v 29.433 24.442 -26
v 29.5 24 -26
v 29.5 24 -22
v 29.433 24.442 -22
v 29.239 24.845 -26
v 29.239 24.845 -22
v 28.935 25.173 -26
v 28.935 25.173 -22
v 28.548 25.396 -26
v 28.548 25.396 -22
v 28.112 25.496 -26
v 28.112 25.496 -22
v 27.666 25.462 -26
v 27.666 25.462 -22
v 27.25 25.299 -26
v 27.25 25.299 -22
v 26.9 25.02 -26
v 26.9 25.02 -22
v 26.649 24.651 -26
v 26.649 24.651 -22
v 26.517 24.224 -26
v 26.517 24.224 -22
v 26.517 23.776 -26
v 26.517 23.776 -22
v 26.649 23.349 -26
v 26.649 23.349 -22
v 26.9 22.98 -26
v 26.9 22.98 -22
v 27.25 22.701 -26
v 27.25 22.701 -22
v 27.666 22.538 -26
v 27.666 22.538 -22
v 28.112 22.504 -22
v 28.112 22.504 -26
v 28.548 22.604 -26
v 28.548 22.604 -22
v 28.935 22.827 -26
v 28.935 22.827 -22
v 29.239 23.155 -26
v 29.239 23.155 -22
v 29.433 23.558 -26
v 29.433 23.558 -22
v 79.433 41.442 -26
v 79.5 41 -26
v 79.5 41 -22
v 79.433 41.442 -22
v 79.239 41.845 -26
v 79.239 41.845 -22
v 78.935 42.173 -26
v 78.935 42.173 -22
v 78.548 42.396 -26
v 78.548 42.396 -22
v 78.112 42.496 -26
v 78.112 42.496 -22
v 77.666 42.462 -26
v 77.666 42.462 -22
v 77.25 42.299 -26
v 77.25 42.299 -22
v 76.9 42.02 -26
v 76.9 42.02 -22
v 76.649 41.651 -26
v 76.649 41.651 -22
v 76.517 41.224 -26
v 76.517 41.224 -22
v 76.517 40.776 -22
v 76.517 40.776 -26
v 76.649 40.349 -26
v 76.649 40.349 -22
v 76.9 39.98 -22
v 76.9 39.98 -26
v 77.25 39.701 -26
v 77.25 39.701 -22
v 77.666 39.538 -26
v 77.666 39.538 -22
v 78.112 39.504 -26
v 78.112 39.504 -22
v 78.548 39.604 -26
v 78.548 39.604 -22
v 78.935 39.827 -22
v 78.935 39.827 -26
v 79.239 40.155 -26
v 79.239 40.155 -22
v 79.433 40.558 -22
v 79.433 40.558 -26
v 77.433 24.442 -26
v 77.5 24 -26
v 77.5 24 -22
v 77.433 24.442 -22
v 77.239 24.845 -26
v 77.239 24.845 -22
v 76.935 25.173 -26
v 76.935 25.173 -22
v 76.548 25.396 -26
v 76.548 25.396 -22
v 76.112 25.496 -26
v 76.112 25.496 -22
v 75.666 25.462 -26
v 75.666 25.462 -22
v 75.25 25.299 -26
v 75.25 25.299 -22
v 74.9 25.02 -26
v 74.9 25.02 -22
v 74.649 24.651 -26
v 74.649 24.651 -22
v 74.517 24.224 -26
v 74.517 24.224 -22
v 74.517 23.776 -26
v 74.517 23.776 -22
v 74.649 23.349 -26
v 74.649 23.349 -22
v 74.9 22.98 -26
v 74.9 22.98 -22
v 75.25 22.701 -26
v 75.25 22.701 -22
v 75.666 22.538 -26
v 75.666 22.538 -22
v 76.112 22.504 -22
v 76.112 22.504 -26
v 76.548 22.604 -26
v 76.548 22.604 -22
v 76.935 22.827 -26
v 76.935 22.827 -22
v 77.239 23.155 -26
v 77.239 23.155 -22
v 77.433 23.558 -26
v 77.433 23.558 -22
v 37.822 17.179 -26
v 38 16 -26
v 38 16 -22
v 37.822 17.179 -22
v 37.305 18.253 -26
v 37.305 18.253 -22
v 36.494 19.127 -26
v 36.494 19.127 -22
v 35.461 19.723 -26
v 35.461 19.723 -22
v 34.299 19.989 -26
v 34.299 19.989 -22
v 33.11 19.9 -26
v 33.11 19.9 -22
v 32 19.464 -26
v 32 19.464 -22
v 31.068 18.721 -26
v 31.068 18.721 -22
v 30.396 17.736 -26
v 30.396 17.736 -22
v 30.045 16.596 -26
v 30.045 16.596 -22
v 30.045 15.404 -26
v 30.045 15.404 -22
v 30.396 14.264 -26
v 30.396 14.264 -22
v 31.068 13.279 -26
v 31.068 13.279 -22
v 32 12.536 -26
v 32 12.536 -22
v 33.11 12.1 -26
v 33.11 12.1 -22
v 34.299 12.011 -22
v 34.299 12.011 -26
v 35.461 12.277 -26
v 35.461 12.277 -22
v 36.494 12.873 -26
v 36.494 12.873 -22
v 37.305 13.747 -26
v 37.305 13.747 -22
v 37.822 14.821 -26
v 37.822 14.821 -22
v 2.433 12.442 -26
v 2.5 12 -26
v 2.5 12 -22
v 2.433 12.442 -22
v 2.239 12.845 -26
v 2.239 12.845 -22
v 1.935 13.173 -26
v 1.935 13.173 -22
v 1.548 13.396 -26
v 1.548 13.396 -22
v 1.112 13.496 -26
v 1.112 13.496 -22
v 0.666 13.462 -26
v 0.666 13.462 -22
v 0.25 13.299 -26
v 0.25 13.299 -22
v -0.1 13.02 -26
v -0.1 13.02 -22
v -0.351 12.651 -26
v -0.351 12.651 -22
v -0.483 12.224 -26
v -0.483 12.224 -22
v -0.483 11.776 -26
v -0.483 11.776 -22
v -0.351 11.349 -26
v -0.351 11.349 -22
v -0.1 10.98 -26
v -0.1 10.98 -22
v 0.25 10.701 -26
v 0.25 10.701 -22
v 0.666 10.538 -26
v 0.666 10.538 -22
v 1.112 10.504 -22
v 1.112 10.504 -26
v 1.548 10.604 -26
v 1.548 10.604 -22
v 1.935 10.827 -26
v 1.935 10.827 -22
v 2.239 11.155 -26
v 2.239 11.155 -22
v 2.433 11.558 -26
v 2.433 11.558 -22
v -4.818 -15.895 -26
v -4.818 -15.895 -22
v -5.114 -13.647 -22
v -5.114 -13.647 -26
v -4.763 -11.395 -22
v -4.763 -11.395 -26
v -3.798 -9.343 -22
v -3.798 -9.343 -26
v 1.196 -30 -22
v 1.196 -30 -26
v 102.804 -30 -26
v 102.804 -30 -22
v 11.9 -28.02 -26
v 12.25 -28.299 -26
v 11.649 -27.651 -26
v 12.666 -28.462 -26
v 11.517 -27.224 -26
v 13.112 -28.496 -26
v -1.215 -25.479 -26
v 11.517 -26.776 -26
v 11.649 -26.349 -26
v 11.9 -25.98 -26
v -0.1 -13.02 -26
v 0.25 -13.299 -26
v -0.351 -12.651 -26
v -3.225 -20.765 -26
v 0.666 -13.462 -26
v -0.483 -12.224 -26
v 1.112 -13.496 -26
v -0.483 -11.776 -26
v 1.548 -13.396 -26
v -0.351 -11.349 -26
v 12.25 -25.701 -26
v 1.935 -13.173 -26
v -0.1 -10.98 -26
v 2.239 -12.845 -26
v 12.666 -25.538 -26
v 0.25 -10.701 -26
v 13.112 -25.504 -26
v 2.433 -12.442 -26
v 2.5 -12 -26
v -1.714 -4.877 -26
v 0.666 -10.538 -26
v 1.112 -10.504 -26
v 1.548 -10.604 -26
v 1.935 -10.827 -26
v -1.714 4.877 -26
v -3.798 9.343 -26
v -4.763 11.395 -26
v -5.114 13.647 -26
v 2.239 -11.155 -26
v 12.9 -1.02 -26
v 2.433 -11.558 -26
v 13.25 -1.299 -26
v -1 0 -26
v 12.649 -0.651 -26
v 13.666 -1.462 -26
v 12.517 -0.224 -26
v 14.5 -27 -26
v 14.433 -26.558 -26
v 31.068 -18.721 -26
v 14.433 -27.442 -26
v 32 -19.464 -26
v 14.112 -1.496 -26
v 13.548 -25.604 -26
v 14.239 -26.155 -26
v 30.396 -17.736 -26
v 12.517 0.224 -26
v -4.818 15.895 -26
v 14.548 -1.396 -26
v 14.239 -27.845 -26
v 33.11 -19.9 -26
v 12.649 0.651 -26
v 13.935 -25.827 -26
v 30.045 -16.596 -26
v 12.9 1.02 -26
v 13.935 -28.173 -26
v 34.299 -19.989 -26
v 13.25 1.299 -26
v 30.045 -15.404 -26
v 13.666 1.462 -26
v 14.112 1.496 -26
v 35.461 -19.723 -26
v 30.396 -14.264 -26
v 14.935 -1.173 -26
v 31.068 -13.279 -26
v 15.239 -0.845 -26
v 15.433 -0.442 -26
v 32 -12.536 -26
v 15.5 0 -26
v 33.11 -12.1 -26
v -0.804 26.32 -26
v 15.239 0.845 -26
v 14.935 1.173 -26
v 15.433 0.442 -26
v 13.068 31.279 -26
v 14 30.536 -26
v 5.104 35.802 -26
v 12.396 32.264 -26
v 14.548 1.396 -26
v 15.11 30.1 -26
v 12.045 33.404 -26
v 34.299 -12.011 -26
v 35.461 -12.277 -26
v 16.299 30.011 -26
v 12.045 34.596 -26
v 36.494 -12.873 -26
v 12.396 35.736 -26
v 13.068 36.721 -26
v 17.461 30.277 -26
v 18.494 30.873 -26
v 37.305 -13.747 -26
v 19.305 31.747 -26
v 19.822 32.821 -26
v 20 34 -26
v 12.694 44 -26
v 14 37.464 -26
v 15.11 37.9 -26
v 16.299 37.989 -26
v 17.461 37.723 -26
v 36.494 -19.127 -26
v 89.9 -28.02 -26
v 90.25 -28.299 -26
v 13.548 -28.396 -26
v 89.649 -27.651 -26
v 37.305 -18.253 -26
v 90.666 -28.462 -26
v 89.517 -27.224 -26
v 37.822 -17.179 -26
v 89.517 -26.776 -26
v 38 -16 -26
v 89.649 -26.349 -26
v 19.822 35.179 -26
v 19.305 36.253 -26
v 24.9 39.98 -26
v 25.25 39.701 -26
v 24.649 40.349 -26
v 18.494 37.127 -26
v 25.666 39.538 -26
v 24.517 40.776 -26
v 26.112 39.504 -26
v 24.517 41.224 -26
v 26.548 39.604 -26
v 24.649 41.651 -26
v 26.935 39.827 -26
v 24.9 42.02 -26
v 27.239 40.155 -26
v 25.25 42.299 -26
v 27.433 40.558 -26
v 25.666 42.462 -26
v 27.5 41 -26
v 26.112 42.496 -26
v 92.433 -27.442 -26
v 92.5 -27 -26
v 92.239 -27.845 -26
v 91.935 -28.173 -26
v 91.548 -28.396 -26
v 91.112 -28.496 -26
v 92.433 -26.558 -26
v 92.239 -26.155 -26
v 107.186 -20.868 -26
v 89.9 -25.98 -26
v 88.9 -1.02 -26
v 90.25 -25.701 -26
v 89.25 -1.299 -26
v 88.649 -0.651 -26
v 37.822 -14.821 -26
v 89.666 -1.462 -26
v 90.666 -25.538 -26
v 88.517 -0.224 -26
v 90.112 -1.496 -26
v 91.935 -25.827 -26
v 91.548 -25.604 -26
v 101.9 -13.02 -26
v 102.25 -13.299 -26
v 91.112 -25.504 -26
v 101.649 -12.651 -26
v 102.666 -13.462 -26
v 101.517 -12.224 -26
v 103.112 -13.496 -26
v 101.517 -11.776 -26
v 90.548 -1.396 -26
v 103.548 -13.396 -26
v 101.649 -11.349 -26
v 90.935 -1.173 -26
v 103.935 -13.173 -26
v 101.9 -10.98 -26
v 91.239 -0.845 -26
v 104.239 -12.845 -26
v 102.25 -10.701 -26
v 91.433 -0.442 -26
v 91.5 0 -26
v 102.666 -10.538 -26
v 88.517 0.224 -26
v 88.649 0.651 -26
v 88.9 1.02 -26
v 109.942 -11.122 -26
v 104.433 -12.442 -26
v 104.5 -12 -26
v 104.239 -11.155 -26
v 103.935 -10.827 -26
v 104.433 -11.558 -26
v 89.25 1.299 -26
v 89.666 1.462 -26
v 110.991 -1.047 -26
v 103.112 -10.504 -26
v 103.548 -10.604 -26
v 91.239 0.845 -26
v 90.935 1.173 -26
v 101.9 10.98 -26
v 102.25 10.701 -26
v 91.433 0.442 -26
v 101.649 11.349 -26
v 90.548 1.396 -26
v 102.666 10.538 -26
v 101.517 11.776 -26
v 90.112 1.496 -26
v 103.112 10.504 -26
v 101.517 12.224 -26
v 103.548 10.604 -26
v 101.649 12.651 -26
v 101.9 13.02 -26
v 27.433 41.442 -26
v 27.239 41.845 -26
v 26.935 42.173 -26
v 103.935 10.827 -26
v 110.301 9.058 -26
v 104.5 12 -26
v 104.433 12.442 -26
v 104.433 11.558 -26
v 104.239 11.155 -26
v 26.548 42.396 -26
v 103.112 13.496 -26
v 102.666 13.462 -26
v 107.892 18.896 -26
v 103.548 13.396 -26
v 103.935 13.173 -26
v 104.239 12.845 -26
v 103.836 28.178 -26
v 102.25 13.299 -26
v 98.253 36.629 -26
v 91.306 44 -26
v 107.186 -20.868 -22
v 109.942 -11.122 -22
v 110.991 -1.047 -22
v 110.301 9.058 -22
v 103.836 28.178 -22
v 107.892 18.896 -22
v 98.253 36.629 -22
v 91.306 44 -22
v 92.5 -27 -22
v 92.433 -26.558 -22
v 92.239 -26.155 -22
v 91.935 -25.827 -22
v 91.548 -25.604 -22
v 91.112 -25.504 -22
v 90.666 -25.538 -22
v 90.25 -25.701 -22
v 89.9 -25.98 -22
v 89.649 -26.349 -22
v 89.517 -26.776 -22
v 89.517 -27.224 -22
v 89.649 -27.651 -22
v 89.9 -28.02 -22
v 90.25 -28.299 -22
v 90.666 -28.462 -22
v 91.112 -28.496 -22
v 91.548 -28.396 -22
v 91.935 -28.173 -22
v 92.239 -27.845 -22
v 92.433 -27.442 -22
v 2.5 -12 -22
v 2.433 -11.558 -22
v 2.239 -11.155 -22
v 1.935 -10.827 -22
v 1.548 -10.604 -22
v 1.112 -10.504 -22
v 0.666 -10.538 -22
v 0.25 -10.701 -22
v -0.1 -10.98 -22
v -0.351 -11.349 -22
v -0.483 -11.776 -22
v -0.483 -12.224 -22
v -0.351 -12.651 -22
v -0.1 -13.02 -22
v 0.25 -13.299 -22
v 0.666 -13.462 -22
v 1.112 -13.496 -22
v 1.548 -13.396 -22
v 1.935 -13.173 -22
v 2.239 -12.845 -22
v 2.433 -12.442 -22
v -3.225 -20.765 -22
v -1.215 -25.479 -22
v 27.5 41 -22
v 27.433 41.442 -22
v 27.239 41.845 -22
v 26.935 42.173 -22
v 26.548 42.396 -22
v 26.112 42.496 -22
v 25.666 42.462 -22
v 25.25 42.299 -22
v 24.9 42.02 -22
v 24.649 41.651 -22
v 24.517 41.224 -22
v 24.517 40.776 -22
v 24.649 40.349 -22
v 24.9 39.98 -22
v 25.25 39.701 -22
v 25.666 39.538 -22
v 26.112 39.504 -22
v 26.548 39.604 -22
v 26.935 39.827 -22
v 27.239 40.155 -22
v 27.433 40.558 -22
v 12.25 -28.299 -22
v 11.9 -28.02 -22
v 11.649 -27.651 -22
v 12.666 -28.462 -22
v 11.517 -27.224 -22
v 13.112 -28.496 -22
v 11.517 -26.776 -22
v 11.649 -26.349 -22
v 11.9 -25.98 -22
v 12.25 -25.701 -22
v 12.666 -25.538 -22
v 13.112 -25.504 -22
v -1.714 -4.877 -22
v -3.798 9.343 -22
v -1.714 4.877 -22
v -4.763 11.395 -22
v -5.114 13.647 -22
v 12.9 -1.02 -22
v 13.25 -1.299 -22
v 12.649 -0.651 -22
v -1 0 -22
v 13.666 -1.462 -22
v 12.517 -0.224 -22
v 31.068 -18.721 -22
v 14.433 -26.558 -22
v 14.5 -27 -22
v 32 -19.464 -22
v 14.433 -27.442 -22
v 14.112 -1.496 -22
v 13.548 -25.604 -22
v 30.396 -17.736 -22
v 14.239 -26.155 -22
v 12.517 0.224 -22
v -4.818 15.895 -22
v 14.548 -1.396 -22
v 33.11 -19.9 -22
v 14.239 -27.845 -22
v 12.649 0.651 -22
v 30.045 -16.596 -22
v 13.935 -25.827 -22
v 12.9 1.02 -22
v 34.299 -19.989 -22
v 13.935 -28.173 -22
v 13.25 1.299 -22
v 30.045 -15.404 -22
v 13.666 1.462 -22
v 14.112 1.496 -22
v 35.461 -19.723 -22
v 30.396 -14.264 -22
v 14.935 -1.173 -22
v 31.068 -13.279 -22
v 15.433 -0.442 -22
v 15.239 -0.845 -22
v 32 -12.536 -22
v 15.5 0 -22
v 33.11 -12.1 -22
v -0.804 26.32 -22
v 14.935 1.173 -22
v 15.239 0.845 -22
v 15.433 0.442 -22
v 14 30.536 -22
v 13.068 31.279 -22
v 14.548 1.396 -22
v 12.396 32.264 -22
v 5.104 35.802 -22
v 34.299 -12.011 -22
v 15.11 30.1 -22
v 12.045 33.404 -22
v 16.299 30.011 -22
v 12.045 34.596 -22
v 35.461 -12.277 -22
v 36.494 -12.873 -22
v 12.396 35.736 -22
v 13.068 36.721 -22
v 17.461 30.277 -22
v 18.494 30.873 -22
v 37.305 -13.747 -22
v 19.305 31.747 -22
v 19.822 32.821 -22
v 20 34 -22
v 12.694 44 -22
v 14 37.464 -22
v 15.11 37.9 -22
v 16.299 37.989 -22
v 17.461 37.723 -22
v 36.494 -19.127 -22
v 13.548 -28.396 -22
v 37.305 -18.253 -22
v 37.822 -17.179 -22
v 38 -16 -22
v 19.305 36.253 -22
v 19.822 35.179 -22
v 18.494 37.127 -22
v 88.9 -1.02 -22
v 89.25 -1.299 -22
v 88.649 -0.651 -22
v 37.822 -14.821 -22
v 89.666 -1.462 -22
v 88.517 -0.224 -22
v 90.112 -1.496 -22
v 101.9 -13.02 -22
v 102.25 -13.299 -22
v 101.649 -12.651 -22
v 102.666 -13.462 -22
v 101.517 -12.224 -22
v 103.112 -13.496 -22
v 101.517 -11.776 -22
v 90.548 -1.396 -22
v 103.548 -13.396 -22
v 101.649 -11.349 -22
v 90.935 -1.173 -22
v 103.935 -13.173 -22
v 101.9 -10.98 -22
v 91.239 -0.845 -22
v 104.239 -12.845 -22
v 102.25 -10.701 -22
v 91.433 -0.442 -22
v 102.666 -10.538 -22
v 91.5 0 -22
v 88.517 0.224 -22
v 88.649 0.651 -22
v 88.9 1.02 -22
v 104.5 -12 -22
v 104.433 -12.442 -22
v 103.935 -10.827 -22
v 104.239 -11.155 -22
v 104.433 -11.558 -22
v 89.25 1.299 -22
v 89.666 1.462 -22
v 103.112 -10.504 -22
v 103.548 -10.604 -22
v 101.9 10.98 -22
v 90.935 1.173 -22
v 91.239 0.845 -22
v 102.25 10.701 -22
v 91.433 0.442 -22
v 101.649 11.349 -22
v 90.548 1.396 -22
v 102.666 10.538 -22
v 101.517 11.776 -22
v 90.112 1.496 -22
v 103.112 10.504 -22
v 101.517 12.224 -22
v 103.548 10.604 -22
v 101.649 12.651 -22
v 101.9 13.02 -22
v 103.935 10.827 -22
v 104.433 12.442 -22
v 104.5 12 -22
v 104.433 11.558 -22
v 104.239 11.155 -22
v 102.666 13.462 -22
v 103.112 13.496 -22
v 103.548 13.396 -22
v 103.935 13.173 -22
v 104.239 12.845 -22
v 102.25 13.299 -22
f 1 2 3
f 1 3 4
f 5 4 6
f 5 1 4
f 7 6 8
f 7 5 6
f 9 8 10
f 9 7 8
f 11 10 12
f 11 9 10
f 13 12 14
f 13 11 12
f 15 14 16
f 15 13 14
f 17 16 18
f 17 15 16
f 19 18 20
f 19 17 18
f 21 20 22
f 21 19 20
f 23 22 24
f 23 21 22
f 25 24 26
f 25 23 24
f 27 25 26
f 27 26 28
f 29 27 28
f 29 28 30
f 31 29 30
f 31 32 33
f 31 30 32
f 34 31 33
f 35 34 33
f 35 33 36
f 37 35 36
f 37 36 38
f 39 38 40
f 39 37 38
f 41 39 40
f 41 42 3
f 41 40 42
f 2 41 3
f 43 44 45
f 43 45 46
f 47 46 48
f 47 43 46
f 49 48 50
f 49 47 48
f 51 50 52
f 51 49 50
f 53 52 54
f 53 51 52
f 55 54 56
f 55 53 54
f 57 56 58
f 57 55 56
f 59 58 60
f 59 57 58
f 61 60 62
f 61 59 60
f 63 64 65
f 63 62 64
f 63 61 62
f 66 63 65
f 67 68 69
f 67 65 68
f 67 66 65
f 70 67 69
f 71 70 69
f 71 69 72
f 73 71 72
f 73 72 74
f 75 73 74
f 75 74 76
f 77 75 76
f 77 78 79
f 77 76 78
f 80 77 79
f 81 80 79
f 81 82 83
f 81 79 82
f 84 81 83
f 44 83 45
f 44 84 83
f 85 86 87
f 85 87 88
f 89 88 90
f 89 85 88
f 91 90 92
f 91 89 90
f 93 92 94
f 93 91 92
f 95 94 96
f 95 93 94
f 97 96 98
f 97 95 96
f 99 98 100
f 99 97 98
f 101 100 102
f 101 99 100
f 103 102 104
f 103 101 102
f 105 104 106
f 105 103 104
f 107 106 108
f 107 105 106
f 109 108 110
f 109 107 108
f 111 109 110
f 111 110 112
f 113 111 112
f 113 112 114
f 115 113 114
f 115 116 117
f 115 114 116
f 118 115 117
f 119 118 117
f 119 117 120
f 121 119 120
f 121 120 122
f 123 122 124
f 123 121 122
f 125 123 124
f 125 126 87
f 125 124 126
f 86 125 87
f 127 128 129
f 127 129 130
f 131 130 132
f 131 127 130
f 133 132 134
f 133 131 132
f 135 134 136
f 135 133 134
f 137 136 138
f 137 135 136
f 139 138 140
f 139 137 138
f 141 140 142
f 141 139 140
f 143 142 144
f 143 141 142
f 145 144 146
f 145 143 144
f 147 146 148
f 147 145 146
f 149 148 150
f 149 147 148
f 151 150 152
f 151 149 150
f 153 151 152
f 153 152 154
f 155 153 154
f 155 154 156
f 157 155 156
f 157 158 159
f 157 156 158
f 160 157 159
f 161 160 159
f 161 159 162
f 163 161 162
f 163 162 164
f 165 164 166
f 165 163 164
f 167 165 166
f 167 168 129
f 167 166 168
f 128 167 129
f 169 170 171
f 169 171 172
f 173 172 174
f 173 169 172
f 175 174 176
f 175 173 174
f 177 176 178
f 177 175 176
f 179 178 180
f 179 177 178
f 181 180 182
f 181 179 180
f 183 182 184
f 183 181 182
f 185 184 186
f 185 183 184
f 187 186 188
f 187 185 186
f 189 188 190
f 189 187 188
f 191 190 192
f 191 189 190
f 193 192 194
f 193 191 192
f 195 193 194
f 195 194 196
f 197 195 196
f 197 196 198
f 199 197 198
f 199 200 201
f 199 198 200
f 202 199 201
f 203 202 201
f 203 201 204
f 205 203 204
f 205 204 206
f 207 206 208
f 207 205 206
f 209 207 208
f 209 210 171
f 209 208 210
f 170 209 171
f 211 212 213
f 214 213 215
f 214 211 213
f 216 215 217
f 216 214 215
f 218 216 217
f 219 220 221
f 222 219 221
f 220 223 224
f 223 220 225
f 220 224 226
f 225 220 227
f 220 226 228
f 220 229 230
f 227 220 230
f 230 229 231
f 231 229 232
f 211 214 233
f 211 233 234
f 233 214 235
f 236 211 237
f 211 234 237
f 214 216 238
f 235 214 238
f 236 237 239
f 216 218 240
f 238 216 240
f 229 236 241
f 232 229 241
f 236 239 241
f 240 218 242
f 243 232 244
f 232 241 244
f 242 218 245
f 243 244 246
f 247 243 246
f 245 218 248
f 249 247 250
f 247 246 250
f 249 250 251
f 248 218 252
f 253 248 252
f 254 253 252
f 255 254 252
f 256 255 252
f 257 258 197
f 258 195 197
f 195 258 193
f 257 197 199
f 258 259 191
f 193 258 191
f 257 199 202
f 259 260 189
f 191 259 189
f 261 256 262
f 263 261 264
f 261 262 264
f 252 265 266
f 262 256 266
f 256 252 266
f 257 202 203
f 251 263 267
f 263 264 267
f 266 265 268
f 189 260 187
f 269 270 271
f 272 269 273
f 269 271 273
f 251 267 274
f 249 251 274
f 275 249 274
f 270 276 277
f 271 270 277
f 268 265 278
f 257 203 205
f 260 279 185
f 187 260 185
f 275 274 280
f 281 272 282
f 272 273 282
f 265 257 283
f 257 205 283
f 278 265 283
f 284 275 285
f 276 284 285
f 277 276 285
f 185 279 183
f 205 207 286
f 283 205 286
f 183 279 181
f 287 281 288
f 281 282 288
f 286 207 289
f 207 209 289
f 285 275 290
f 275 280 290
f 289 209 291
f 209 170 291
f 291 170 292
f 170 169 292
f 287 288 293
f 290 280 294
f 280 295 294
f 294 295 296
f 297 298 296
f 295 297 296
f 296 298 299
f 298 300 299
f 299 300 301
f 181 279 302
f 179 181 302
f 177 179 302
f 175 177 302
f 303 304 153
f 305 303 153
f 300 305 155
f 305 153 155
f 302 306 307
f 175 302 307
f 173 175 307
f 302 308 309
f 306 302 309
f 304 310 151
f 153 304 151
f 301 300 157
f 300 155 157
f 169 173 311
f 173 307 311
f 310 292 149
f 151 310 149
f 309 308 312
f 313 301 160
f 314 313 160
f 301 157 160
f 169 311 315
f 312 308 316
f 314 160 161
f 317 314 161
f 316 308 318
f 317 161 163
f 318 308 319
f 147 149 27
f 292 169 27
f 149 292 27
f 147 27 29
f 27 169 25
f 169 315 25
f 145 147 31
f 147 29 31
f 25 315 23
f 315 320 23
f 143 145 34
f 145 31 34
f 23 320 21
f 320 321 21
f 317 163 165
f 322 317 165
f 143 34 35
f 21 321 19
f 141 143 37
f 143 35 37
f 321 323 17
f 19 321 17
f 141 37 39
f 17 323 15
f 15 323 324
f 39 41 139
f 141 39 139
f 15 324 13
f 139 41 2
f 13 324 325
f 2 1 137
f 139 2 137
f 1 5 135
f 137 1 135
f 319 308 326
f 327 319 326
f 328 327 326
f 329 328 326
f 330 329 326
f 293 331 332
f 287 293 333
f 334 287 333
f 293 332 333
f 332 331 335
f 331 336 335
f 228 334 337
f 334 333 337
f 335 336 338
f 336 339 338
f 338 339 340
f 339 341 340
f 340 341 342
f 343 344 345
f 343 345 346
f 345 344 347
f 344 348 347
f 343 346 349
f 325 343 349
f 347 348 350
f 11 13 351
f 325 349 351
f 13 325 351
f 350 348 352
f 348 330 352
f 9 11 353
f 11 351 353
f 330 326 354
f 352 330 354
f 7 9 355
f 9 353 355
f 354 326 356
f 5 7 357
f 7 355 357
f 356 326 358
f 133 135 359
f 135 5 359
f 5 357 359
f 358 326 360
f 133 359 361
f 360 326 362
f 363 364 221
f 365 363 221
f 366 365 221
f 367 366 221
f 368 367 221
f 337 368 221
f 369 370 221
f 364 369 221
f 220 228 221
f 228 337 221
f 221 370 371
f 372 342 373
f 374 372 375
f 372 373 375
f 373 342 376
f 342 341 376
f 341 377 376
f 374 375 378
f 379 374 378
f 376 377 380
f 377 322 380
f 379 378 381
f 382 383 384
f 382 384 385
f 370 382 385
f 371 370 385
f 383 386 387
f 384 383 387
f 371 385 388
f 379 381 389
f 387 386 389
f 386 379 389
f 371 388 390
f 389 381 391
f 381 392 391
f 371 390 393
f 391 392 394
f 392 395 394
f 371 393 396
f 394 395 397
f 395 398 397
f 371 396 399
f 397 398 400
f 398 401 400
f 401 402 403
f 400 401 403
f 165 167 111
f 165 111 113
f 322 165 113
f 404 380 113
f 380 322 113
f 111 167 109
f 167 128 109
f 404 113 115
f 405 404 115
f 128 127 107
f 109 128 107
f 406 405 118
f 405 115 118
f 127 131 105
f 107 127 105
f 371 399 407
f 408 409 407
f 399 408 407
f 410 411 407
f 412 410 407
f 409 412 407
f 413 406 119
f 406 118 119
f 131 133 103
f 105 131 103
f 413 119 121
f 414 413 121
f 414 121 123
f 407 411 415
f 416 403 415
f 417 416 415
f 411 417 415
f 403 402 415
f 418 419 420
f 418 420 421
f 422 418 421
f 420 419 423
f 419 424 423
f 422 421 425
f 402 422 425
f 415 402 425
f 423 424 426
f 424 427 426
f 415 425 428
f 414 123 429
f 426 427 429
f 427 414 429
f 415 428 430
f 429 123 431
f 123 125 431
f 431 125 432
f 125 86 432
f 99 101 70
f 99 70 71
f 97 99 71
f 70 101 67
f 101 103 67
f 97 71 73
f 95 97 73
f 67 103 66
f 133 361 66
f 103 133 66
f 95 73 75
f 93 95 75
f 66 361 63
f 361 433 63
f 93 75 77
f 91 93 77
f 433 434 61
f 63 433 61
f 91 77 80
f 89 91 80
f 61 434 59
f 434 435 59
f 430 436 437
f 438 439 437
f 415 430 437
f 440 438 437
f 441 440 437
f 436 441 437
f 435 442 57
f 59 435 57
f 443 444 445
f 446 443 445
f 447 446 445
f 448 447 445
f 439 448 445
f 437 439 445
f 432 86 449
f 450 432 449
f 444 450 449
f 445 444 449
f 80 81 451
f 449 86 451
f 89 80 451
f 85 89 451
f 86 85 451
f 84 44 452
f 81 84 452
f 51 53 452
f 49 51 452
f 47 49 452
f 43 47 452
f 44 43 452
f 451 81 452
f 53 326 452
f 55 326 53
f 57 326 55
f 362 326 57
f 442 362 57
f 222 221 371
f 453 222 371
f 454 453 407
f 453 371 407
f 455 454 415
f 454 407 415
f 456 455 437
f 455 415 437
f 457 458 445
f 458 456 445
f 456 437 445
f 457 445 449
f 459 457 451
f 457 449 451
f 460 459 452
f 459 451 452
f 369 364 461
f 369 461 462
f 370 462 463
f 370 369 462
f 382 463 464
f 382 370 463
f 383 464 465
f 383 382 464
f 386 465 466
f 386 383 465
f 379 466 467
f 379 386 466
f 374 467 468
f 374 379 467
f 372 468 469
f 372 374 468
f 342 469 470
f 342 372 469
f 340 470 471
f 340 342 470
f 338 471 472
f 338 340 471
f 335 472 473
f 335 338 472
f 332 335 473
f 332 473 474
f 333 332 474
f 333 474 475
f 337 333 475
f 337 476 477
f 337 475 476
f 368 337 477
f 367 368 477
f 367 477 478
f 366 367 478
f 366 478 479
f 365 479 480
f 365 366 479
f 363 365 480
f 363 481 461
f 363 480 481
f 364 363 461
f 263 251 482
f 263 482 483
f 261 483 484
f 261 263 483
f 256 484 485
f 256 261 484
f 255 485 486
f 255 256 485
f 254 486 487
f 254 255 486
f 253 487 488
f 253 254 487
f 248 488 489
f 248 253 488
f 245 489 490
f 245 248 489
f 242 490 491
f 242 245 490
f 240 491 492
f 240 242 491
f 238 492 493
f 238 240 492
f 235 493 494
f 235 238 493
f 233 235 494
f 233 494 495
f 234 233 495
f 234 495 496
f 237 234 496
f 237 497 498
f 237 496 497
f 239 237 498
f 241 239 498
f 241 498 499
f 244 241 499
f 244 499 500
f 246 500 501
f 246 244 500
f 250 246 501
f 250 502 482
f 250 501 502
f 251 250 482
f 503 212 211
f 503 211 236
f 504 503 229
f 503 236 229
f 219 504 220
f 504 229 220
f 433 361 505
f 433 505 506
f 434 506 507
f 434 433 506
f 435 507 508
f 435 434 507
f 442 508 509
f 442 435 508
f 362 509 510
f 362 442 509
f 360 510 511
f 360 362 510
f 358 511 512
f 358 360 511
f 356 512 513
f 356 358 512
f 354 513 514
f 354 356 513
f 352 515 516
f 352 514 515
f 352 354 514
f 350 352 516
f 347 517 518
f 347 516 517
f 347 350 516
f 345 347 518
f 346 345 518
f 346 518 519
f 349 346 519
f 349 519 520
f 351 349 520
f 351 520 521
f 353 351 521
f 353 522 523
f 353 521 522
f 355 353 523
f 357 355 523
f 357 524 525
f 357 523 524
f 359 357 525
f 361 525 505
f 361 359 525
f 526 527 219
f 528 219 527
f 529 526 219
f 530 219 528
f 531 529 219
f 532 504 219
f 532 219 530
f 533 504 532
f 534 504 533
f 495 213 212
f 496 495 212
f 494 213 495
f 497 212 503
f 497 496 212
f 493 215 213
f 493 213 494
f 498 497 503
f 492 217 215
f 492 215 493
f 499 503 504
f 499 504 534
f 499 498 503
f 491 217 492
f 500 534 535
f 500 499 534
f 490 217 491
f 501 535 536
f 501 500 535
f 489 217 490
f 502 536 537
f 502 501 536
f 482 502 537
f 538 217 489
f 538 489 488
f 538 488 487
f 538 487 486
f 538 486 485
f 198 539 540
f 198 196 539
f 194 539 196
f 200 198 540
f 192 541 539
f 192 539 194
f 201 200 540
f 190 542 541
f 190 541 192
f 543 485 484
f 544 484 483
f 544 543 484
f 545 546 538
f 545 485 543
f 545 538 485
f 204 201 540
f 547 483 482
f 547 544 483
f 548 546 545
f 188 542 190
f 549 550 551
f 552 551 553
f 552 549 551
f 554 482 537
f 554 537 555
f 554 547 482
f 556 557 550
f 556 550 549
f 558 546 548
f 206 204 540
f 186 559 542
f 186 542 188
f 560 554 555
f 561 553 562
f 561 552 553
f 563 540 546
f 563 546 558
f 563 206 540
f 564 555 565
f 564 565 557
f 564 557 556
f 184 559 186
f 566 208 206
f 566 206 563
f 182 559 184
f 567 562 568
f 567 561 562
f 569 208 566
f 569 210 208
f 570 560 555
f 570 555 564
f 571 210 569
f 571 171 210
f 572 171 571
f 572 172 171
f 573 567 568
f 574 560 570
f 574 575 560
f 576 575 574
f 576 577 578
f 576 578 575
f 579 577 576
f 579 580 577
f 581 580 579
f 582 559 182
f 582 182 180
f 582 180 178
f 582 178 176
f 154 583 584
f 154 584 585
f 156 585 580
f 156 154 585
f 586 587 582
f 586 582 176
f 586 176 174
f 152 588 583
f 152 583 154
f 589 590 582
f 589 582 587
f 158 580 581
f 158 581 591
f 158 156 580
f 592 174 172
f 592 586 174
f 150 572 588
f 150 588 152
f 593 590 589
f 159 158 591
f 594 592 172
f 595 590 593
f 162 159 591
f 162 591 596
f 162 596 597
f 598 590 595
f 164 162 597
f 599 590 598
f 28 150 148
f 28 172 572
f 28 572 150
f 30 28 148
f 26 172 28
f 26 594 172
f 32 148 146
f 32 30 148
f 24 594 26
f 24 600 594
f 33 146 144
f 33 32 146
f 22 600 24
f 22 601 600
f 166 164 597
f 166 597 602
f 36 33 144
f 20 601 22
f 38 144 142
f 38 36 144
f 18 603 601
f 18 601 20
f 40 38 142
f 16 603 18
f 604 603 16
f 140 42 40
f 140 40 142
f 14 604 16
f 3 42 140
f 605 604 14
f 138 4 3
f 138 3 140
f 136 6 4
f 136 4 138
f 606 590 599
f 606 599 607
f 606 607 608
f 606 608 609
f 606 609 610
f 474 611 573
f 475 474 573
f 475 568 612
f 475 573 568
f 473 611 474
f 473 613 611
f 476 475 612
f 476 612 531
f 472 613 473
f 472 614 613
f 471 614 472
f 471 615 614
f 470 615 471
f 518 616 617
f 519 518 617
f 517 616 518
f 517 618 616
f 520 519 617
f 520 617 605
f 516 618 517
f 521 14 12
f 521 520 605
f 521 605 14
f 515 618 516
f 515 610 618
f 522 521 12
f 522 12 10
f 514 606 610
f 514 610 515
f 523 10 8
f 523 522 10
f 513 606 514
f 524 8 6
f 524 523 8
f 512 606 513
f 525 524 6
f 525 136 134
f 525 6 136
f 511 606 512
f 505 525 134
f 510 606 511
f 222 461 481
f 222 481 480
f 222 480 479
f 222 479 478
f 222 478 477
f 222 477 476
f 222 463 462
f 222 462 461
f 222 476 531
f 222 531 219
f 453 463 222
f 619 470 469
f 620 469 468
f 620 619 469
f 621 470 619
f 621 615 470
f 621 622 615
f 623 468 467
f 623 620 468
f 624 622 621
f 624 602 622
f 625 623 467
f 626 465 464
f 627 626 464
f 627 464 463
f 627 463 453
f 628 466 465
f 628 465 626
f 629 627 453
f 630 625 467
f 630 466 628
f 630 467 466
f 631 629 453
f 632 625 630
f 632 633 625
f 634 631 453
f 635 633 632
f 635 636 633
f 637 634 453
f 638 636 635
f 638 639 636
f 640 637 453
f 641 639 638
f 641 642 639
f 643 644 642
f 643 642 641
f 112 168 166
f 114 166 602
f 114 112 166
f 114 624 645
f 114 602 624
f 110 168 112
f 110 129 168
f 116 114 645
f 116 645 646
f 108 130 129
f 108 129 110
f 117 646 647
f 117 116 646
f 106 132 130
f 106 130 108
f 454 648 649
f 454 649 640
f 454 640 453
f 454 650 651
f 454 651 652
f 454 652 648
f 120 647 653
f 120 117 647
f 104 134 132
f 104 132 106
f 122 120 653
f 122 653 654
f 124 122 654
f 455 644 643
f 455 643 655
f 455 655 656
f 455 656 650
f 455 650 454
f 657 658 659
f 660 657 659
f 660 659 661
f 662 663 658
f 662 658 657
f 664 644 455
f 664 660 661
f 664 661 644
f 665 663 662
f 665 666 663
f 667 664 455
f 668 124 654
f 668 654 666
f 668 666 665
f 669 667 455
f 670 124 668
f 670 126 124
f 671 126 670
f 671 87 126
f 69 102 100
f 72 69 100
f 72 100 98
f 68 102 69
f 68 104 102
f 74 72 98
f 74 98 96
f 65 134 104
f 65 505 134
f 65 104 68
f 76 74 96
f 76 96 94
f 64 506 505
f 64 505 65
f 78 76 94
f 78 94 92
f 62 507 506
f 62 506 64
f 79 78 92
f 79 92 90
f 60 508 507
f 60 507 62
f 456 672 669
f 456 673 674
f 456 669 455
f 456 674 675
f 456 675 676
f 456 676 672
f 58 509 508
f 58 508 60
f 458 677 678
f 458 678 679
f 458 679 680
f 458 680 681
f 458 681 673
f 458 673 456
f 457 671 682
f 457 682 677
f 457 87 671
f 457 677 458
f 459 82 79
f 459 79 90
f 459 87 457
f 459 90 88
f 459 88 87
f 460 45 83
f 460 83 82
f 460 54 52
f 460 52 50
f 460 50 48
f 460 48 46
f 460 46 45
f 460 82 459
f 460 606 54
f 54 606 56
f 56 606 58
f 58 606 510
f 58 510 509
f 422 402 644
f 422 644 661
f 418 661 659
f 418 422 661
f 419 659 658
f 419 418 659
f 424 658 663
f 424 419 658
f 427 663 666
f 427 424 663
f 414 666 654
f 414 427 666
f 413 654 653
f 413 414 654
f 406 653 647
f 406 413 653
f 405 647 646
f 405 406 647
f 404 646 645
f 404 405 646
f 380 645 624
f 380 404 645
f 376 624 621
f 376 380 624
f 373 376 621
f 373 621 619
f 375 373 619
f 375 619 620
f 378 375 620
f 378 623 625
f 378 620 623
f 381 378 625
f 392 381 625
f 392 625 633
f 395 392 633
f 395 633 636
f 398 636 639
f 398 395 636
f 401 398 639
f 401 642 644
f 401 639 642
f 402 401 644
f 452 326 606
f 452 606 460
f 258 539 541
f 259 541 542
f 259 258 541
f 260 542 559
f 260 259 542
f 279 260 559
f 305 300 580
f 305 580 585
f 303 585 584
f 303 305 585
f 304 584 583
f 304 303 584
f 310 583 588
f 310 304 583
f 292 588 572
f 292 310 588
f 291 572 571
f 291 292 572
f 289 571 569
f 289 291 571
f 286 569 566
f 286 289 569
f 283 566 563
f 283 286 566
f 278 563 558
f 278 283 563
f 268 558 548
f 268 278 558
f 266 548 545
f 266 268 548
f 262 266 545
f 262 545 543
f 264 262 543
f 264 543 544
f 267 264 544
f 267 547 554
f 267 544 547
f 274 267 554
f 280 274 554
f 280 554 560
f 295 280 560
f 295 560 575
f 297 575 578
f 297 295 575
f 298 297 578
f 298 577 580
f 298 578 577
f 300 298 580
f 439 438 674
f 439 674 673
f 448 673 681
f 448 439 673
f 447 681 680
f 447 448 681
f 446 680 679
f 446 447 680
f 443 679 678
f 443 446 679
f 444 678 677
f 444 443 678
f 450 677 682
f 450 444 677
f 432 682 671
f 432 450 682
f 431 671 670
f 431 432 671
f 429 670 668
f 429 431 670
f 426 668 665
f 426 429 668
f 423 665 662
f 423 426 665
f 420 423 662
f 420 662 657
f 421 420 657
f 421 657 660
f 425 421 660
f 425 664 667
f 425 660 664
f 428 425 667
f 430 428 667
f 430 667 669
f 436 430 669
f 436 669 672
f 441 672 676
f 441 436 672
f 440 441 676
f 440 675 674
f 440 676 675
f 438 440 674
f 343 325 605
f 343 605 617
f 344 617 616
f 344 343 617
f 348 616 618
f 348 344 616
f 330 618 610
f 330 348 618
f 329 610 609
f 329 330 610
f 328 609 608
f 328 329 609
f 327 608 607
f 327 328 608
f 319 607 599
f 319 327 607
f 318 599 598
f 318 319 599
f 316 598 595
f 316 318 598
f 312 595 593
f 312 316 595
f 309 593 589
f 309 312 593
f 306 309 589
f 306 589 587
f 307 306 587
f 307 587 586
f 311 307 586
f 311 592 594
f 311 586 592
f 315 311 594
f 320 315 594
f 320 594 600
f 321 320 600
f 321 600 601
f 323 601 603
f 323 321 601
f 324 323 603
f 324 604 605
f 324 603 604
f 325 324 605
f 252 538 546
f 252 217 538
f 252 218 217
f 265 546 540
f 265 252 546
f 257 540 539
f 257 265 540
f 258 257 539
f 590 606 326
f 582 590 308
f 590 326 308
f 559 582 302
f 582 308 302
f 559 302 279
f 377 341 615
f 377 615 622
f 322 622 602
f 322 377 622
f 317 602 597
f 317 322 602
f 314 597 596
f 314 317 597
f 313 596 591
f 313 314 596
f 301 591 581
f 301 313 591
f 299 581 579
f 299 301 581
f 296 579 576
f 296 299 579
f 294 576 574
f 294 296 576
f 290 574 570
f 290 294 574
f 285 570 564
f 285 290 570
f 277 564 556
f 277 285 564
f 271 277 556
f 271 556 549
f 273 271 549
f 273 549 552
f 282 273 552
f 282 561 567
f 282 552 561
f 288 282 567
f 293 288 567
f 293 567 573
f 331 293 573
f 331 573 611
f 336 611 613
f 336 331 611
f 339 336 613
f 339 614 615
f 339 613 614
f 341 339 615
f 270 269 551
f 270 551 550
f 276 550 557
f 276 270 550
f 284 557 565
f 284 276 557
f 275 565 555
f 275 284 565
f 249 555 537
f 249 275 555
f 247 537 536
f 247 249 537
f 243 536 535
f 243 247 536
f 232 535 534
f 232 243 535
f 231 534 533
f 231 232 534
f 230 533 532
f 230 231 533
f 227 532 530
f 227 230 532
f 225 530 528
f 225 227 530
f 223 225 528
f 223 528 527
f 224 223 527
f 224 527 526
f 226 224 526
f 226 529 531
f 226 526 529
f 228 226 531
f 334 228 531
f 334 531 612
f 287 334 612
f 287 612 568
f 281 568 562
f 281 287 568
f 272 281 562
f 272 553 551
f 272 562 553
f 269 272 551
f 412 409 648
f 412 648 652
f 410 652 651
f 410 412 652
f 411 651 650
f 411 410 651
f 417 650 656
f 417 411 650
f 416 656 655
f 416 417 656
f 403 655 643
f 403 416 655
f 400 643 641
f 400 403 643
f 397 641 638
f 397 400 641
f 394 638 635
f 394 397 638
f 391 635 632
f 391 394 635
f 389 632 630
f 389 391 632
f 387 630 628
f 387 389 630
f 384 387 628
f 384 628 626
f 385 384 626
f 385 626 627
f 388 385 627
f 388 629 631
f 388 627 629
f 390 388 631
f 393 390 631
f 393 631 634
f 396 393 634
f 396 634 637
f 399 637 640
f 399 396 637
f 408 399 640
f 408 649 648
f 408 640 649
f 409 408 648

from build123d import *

# Parameters (mm, degrees)
CYLINDER1946_R     = 17
CYLINDER1946_DEPTH = 160
CYLINDER1910_R     = 1.5
CYLINDER1910_DEPTH = 100
CYLINDER1943_R     = 1.5
CYLINDER1943_DEPTH = 100
CYLINDER1944_R     = 1.5
CYLINDER1944_DEPTH = 32
CYLINDER1903_R     = 1.5
CYLINDER1903_DEPTH = 32
BOX555_W           = 200
BOX555_H           = 100
BOX555_DEPTH       = 100
BOX556_W           = 200
BOX556_H           = 100
BOX556_DEPTH       = 100
CYLINDER1907_R     = 4
CYLINDER1907_DEPTH = 100
CYLINDER1908_R     = 4
CYLINDER1908_DEPTH = 100
CYLINDER1912_R     = 4
CYLINDER1912_DEPTH = 100
CYLINDER1913_R     = 4
CYLINDER1913_DEPTH = 100
CYLINDER1914_R     = 4
CYLINDER1914_DEPTH = 100
CYLINDER1901_R     = 4
CYLINDER1901_DEPTH = 100
CYLINDER1902_R     = 4
CYLINDER1902_DEPTH = 100
CYLINDER1919_R     = 4
CYLINDER1919_DEPTH = 100
CYLINDER1927_R     = 1.5
CYLINDER1927_DEPTH = 100
CYLINDER1926_R     = 1.5
CYLINDER1926_DEPTH = 100
CYLINDER1891_R     = 1.5
CYLINDER1891_DEPTH = 100
CYLINDER1894_R     = 1.5
CYLINDER1894_DEPTH = 100
CYLINDER1917_R     = 1.5
CYLINDER1917_DEPTH = 100
CYLINDER1898_R     = 1.5
CYLINDER1898_DEPTH = 100
CYLINDER1920_R     = 1.5
CYLINDER1920_DEPTH = 100
CYLINDER1924_R     = 1.5
CYLINDER1924_DEPTH = 100
CYLINDER1925_R     = 59
CYLINDER1925_DEPTH = 4
FILLET029_R        = 8
FILLET027_R        = 8


with BuildPart() as v_lec1946:
    # Cylinder1946 → Cylinder1946 (new body)
    with BuildSketch(Plane(origin=(-18, 0, -60), x_dir=(1, 0, 0), z_dir=(0, 0, 1))):
        Circle(CYLINDER1946_R)
    extrude(amount=CYLINDER1946_DEPTH)


with BuildPart() as v_lec1910:
    # Cylinder1910 → Cylinder1910 (new body)
    with BuildSketch(Plane(origin=(14, 0, -60), x_dir=(1, 0, 0), z_dir=(0, 0, 1))):
        Circle(CYLINDER1910_R)
    extrude(amount=CYLINDER1910_DEPTH)


with BuildPart() as srouby_troj013:
    # Cylinder1943 → Cylinder1943 (new body)
    with BuildSketch(Plane(origin=(90, 0, -60), x_dir=(1, 0, 0), z_dir=(0, 0, 1))):
        Circle(CYLINDER1943_R)
    extrude(amount=CYLINDER1943_DEPTH)

    # Compound988: union Válec1910
    add(v_lec1910.part)


with BuildPart() as v_lec1944:
    # Cylinder1944 → Cylinder1944 (new body)
    with BuildSketch(Plane(origin=(78, 41, -42), x_dir=(1, 0, 0), z_dir=(0, 0, 1))):
        Circle(CYLINDER1944_R)
    extrude(amount=CYLINDER1944_DEPTH)


with BuildPart() as compound991:
    # Cylinder1903 → Cylinder1903 (new body)
    with BuildSketch(Plane(origin=(26, 41, -42), x_dir=(1, 0, 0), z_dir=(0, 0, 1))):
        Circle(CYLINDER1903_R)
    extrude(amount=CYLINDER1903_DEPTH)

    # Compound991: union Válec1944
    add(v_lec1944.part)


with BuildPart() as krychle555:
    # Box555 → Box555 (new body)
    with BuildSketch(Plane(origin=(-60, 44, -90), x_dir=(1, 0, 0), z_dir=(0, 0, 1))):
        with Locations((100, 50)):
            Rectangle(BOX555_W, BOX555_H)
    extrude(amount=BOX555_DEPTH)


with BuildPart() as krychle556:
    # Box556 → Box556 (new body)
    with BuildSketch(Plane(origin=(-60, -130, -90), x_dir=(1, 0, 0), z_dir=(0, 0, 1))):
        with Locations((100, 50)):
            Rectangle(BOX556_W, BOX556_H)
    extrude(amount=BOX556_DEPTH)


with BuildPart() as v_lec1907:
    # Cylinder1907 → Cylinder1907 (new body)
    with BuildSketch(Plane(origin=(-16, 34, -90), x_dir=(1, 0, 0), z_dir=(0, 0, 1))):
        Circle(CYLINDER1907_R)
    extrude(amount=CYLINDER1907_DEPTH)


with BuildPart() as v_lec1908:
    # Cylinder1908 → Cylinder1908 (new body)
    with BuildSketch(Plane(origin=(-16, -34, -90), x_dir=(1, 0, 0), z_dir=(0, 0, 1))):
        Circle(CYLINDER1908_R)
    extrude(amount=CYLINDER1908_DEPTH)


with BuildPart() as v_lec1912:
    # Cylinder1912 → Cylinder1912 (new body)
    with BuildSketch(Plane(origin=(34, -16, -90), x_dir=(1, 0, 0), z_dir=(0, 0, 1))):
        Circle(CYLINDER1912_R)
    extrude(amount=CYLINDER1912_DEPTH)


with BuildPart() as v_lec1913:
    # Cylinder1913 → Cylinder1913 (new body)
    with BuildSketch(Plane(origin=(16, 34, -90), x_dir=(1, 0, 0), z_dir=(0, 0, 1))):
        Circle(CYLINDER1913_R)
    extrude(amount=CYLINDER1913_DEPTH)


with BuildPart() as v_lec1914:
    # Cylinder1914 → Cylinder1914 (new body)
    with BuildSketch(Plane(origin=(16, -34, -90), x_dir=(1, 0, 0), z_dir=(0, 0, 1))):
        Circle(CYLINDER1914_R)
    extrude(amount=CYLINDER1914_DEPTH)


with BuildPart() as v_lec1901:
    # Cylinder1901 → Cylinder1901 (new body)
    with BuildSketch(Plane(origin=(-34, 16, -90), x_dir=(1, 0, 0), z_dir=(0, 0, 1))):
        Circle(CYLINDER1901_R)
    extrude(amount=CYLINDER1901_DEPTH)


with BuildPart() as v_lec1902:
    # Cylinder1902 → Cylinder1902 (new body)
    with BuildSketch(Plane(origin=(34, 16, -90), x_dir=(1, 0, 0), z_dir=(0, 0, 1))):
        Circle(CYLINDER1902_R)
    extrude(amount=CYLINDER1902_DEPTH)


with BuildPart() as sbouby_baze_silne022:
    # Cylinder1919 → Cylinder1919 (new body)
    with BuildSketch(Plane(origin=(-34, -16, -90), x_dir=(1, 0, 0), z_dir=(0, 0, 1))):
        Circle(CYLINDER1919_R)
    extrude(amount=CYLINDER1919_DEPTH)

    # Compound981: union Válec1907, Válec1908, Válec1912, Válec1913, Válec1914, Válec1901, Válec1902
    add(v_lec1907.part)
    add(v_lec1908.part)
    add(v_lec1912.part)
    add(v_lec1913.part)
    add(v_lec1914.part)
    add(v_lec1901.part)
    add(v_lec1902.part)


with BuildPart() as v_lec1927:
    # Cylinder1927 → Cylinder1927 (new body)
    with BuildSketch(Plane(origin=(103, 12, -60), x_dir=(1, 0, 0), z_dir=(0, 0, 1))):
        Circle(CYLINDER1927_R)
    extrude(amount=CYLINDER1927_DEPTH)


with BuildPart() as v_lec1926:
    # Cylinder1926 → Cylinder1926 (new body)
    with BuildSketch(Plane(origin=(76, 24, -60), x_dir=(1, 0, 0), z_dir=(0, 0, 1))):
        Circle(CYLINDER1926_R)
    extrude(amount=CYLINDER1926_DEPTH)


with BuildPart() as v_lec1891:
    # Cylinder1891 → Cylinder1891 (new body)
    with BuildSketch(Plane(origin=(91, -27, -60), x_dir=(1, 0, 0), z_dir=(0, 0, 1))):
        Circle(CYLINDER1891_R)
    extrude(amount=CYLINDER1891_DEPTH)


with BuildPart() as v_lec1894:
    # Cylinder1894 → Cylinder1894 (new body)
    with BuildSketch(Plane(origin=(13, -27, -60), x_dir=(1, 0, 0), z_dir=(0, 0, 1))):
        Circle(CYLINDER1894_R)
    extrude(amount=CYLINDER1894_DEPTH)


with BuildPart() as v_lec1917:
    # Cylinder1917 → Cylinder1917 (new body)
    with BuildSketch(Plane(origin=(28, 24, -60), x_dir=(1, 0, 0), z_dir=(0, 0, 1))):
        Circle(CYLINDER1917_R)
    extrude(amount=CYLINDER1917_DEPTH)


with BuildPart() as v_lec1898:
    # Cylinder1898 → Cylinder1898 (new body)
    with BuildSketch(Plane(origin=(1, -12, -60), x_dir=(1, 0, 0), z_dir=(0, 0, 1))):
        Circle(CYLINDER1898_R)
    extrude(amount=CYLINDER1898_DEPTH)


with BuildPart() as v_lec1920:
    # Cylinder1920 → Cylinder1920 (new body)
    with BuildSketch(Plane(origin=(1, 12, -60), x_dir=(1, 0, 0), z_dir=(0, 0, 1))):
        Circle(CYLINDER1920_R)
    extrude(amount=CYLINDER1920_DEPTH)


with BuildPart() as srouby_monoblok014:
    # Cylinder1924 → Cylinder1924 (new body)
    with BuildSketch(Plane(origin=(103, -12, -60), x_dir=(1, 0, 0), z_dir=(0, 0, 1))):
        Circle(CYLINDER1924_R)
    extrude(amount=CYLINDER1924_DEPTH)

    # Compound979: union Válec1927, Válec1926, Válec1891, Válec1894, Válec1917, Válec1898, Válec1920
    add(v_lec1927.part)
    add(v_lec1926.part)
    add(v_lec1891.part)
    add(v_lec1894.part)
    add(v_lec1917.part)
    add(v_lec1898.part)
    add(v_lec1920.part)


with BuildPart() as fillet027:
    # Cylinder1925 → Cylinder1925 (new body)
    with BuildSketch(Plane(origin=(52, 0, -26), x_dir=(1, 0, 0), z_dir=(0, 0, 1))):
        Circle(CYLINDER1925_R)
    extrude(amount=CYLINDER1925_DEPTH)

    # Cut630: cut srouby_monoblok014
    add(srouby_monoblok014.part, mode=Mode.SUBTRACT)

    # Cut644: cut sbouby_baze_silne022
    add(sbouby_baze_silne022.part, mode=Mode.SUBTRACT)

    # Cut645: cut Krychle556
    add(krychle556.part, mode=Mode.SUBTRACT)

    # Cut646: cut Krychle555
    add(krychle555.part, mode=Mode.SUBTRACT)

    # Cut647: cut Compound991
    add(compound991.part, mode=Mode.SUBTRACT)

    # Cut651: cut srouby_troj013
    add(srouby_troj013.part, mode=Mode.SUBTRACT)

    # Cut636: cut Válec1946
    add(v_lec1946.part, mode=Mode.SUBTRACT)

    # Fillet029
    fillet029_edges = [fillet027.edges().sort_by_distance(p)[0] for p in [
        (-5.8, -11.838919, -24),
    ]]
    fillet(fillet029_edges, radius=FILLET029_R)

    # Fillet027
    fillet027_edges = [fillet027.edges().sort_by_distance(p)[0] for p in [
        (-5.8, 11.838919, -24),
    ]]
    fillet(fillet027_edges, radius=FILLET027_R)


solid = fillet027.part
